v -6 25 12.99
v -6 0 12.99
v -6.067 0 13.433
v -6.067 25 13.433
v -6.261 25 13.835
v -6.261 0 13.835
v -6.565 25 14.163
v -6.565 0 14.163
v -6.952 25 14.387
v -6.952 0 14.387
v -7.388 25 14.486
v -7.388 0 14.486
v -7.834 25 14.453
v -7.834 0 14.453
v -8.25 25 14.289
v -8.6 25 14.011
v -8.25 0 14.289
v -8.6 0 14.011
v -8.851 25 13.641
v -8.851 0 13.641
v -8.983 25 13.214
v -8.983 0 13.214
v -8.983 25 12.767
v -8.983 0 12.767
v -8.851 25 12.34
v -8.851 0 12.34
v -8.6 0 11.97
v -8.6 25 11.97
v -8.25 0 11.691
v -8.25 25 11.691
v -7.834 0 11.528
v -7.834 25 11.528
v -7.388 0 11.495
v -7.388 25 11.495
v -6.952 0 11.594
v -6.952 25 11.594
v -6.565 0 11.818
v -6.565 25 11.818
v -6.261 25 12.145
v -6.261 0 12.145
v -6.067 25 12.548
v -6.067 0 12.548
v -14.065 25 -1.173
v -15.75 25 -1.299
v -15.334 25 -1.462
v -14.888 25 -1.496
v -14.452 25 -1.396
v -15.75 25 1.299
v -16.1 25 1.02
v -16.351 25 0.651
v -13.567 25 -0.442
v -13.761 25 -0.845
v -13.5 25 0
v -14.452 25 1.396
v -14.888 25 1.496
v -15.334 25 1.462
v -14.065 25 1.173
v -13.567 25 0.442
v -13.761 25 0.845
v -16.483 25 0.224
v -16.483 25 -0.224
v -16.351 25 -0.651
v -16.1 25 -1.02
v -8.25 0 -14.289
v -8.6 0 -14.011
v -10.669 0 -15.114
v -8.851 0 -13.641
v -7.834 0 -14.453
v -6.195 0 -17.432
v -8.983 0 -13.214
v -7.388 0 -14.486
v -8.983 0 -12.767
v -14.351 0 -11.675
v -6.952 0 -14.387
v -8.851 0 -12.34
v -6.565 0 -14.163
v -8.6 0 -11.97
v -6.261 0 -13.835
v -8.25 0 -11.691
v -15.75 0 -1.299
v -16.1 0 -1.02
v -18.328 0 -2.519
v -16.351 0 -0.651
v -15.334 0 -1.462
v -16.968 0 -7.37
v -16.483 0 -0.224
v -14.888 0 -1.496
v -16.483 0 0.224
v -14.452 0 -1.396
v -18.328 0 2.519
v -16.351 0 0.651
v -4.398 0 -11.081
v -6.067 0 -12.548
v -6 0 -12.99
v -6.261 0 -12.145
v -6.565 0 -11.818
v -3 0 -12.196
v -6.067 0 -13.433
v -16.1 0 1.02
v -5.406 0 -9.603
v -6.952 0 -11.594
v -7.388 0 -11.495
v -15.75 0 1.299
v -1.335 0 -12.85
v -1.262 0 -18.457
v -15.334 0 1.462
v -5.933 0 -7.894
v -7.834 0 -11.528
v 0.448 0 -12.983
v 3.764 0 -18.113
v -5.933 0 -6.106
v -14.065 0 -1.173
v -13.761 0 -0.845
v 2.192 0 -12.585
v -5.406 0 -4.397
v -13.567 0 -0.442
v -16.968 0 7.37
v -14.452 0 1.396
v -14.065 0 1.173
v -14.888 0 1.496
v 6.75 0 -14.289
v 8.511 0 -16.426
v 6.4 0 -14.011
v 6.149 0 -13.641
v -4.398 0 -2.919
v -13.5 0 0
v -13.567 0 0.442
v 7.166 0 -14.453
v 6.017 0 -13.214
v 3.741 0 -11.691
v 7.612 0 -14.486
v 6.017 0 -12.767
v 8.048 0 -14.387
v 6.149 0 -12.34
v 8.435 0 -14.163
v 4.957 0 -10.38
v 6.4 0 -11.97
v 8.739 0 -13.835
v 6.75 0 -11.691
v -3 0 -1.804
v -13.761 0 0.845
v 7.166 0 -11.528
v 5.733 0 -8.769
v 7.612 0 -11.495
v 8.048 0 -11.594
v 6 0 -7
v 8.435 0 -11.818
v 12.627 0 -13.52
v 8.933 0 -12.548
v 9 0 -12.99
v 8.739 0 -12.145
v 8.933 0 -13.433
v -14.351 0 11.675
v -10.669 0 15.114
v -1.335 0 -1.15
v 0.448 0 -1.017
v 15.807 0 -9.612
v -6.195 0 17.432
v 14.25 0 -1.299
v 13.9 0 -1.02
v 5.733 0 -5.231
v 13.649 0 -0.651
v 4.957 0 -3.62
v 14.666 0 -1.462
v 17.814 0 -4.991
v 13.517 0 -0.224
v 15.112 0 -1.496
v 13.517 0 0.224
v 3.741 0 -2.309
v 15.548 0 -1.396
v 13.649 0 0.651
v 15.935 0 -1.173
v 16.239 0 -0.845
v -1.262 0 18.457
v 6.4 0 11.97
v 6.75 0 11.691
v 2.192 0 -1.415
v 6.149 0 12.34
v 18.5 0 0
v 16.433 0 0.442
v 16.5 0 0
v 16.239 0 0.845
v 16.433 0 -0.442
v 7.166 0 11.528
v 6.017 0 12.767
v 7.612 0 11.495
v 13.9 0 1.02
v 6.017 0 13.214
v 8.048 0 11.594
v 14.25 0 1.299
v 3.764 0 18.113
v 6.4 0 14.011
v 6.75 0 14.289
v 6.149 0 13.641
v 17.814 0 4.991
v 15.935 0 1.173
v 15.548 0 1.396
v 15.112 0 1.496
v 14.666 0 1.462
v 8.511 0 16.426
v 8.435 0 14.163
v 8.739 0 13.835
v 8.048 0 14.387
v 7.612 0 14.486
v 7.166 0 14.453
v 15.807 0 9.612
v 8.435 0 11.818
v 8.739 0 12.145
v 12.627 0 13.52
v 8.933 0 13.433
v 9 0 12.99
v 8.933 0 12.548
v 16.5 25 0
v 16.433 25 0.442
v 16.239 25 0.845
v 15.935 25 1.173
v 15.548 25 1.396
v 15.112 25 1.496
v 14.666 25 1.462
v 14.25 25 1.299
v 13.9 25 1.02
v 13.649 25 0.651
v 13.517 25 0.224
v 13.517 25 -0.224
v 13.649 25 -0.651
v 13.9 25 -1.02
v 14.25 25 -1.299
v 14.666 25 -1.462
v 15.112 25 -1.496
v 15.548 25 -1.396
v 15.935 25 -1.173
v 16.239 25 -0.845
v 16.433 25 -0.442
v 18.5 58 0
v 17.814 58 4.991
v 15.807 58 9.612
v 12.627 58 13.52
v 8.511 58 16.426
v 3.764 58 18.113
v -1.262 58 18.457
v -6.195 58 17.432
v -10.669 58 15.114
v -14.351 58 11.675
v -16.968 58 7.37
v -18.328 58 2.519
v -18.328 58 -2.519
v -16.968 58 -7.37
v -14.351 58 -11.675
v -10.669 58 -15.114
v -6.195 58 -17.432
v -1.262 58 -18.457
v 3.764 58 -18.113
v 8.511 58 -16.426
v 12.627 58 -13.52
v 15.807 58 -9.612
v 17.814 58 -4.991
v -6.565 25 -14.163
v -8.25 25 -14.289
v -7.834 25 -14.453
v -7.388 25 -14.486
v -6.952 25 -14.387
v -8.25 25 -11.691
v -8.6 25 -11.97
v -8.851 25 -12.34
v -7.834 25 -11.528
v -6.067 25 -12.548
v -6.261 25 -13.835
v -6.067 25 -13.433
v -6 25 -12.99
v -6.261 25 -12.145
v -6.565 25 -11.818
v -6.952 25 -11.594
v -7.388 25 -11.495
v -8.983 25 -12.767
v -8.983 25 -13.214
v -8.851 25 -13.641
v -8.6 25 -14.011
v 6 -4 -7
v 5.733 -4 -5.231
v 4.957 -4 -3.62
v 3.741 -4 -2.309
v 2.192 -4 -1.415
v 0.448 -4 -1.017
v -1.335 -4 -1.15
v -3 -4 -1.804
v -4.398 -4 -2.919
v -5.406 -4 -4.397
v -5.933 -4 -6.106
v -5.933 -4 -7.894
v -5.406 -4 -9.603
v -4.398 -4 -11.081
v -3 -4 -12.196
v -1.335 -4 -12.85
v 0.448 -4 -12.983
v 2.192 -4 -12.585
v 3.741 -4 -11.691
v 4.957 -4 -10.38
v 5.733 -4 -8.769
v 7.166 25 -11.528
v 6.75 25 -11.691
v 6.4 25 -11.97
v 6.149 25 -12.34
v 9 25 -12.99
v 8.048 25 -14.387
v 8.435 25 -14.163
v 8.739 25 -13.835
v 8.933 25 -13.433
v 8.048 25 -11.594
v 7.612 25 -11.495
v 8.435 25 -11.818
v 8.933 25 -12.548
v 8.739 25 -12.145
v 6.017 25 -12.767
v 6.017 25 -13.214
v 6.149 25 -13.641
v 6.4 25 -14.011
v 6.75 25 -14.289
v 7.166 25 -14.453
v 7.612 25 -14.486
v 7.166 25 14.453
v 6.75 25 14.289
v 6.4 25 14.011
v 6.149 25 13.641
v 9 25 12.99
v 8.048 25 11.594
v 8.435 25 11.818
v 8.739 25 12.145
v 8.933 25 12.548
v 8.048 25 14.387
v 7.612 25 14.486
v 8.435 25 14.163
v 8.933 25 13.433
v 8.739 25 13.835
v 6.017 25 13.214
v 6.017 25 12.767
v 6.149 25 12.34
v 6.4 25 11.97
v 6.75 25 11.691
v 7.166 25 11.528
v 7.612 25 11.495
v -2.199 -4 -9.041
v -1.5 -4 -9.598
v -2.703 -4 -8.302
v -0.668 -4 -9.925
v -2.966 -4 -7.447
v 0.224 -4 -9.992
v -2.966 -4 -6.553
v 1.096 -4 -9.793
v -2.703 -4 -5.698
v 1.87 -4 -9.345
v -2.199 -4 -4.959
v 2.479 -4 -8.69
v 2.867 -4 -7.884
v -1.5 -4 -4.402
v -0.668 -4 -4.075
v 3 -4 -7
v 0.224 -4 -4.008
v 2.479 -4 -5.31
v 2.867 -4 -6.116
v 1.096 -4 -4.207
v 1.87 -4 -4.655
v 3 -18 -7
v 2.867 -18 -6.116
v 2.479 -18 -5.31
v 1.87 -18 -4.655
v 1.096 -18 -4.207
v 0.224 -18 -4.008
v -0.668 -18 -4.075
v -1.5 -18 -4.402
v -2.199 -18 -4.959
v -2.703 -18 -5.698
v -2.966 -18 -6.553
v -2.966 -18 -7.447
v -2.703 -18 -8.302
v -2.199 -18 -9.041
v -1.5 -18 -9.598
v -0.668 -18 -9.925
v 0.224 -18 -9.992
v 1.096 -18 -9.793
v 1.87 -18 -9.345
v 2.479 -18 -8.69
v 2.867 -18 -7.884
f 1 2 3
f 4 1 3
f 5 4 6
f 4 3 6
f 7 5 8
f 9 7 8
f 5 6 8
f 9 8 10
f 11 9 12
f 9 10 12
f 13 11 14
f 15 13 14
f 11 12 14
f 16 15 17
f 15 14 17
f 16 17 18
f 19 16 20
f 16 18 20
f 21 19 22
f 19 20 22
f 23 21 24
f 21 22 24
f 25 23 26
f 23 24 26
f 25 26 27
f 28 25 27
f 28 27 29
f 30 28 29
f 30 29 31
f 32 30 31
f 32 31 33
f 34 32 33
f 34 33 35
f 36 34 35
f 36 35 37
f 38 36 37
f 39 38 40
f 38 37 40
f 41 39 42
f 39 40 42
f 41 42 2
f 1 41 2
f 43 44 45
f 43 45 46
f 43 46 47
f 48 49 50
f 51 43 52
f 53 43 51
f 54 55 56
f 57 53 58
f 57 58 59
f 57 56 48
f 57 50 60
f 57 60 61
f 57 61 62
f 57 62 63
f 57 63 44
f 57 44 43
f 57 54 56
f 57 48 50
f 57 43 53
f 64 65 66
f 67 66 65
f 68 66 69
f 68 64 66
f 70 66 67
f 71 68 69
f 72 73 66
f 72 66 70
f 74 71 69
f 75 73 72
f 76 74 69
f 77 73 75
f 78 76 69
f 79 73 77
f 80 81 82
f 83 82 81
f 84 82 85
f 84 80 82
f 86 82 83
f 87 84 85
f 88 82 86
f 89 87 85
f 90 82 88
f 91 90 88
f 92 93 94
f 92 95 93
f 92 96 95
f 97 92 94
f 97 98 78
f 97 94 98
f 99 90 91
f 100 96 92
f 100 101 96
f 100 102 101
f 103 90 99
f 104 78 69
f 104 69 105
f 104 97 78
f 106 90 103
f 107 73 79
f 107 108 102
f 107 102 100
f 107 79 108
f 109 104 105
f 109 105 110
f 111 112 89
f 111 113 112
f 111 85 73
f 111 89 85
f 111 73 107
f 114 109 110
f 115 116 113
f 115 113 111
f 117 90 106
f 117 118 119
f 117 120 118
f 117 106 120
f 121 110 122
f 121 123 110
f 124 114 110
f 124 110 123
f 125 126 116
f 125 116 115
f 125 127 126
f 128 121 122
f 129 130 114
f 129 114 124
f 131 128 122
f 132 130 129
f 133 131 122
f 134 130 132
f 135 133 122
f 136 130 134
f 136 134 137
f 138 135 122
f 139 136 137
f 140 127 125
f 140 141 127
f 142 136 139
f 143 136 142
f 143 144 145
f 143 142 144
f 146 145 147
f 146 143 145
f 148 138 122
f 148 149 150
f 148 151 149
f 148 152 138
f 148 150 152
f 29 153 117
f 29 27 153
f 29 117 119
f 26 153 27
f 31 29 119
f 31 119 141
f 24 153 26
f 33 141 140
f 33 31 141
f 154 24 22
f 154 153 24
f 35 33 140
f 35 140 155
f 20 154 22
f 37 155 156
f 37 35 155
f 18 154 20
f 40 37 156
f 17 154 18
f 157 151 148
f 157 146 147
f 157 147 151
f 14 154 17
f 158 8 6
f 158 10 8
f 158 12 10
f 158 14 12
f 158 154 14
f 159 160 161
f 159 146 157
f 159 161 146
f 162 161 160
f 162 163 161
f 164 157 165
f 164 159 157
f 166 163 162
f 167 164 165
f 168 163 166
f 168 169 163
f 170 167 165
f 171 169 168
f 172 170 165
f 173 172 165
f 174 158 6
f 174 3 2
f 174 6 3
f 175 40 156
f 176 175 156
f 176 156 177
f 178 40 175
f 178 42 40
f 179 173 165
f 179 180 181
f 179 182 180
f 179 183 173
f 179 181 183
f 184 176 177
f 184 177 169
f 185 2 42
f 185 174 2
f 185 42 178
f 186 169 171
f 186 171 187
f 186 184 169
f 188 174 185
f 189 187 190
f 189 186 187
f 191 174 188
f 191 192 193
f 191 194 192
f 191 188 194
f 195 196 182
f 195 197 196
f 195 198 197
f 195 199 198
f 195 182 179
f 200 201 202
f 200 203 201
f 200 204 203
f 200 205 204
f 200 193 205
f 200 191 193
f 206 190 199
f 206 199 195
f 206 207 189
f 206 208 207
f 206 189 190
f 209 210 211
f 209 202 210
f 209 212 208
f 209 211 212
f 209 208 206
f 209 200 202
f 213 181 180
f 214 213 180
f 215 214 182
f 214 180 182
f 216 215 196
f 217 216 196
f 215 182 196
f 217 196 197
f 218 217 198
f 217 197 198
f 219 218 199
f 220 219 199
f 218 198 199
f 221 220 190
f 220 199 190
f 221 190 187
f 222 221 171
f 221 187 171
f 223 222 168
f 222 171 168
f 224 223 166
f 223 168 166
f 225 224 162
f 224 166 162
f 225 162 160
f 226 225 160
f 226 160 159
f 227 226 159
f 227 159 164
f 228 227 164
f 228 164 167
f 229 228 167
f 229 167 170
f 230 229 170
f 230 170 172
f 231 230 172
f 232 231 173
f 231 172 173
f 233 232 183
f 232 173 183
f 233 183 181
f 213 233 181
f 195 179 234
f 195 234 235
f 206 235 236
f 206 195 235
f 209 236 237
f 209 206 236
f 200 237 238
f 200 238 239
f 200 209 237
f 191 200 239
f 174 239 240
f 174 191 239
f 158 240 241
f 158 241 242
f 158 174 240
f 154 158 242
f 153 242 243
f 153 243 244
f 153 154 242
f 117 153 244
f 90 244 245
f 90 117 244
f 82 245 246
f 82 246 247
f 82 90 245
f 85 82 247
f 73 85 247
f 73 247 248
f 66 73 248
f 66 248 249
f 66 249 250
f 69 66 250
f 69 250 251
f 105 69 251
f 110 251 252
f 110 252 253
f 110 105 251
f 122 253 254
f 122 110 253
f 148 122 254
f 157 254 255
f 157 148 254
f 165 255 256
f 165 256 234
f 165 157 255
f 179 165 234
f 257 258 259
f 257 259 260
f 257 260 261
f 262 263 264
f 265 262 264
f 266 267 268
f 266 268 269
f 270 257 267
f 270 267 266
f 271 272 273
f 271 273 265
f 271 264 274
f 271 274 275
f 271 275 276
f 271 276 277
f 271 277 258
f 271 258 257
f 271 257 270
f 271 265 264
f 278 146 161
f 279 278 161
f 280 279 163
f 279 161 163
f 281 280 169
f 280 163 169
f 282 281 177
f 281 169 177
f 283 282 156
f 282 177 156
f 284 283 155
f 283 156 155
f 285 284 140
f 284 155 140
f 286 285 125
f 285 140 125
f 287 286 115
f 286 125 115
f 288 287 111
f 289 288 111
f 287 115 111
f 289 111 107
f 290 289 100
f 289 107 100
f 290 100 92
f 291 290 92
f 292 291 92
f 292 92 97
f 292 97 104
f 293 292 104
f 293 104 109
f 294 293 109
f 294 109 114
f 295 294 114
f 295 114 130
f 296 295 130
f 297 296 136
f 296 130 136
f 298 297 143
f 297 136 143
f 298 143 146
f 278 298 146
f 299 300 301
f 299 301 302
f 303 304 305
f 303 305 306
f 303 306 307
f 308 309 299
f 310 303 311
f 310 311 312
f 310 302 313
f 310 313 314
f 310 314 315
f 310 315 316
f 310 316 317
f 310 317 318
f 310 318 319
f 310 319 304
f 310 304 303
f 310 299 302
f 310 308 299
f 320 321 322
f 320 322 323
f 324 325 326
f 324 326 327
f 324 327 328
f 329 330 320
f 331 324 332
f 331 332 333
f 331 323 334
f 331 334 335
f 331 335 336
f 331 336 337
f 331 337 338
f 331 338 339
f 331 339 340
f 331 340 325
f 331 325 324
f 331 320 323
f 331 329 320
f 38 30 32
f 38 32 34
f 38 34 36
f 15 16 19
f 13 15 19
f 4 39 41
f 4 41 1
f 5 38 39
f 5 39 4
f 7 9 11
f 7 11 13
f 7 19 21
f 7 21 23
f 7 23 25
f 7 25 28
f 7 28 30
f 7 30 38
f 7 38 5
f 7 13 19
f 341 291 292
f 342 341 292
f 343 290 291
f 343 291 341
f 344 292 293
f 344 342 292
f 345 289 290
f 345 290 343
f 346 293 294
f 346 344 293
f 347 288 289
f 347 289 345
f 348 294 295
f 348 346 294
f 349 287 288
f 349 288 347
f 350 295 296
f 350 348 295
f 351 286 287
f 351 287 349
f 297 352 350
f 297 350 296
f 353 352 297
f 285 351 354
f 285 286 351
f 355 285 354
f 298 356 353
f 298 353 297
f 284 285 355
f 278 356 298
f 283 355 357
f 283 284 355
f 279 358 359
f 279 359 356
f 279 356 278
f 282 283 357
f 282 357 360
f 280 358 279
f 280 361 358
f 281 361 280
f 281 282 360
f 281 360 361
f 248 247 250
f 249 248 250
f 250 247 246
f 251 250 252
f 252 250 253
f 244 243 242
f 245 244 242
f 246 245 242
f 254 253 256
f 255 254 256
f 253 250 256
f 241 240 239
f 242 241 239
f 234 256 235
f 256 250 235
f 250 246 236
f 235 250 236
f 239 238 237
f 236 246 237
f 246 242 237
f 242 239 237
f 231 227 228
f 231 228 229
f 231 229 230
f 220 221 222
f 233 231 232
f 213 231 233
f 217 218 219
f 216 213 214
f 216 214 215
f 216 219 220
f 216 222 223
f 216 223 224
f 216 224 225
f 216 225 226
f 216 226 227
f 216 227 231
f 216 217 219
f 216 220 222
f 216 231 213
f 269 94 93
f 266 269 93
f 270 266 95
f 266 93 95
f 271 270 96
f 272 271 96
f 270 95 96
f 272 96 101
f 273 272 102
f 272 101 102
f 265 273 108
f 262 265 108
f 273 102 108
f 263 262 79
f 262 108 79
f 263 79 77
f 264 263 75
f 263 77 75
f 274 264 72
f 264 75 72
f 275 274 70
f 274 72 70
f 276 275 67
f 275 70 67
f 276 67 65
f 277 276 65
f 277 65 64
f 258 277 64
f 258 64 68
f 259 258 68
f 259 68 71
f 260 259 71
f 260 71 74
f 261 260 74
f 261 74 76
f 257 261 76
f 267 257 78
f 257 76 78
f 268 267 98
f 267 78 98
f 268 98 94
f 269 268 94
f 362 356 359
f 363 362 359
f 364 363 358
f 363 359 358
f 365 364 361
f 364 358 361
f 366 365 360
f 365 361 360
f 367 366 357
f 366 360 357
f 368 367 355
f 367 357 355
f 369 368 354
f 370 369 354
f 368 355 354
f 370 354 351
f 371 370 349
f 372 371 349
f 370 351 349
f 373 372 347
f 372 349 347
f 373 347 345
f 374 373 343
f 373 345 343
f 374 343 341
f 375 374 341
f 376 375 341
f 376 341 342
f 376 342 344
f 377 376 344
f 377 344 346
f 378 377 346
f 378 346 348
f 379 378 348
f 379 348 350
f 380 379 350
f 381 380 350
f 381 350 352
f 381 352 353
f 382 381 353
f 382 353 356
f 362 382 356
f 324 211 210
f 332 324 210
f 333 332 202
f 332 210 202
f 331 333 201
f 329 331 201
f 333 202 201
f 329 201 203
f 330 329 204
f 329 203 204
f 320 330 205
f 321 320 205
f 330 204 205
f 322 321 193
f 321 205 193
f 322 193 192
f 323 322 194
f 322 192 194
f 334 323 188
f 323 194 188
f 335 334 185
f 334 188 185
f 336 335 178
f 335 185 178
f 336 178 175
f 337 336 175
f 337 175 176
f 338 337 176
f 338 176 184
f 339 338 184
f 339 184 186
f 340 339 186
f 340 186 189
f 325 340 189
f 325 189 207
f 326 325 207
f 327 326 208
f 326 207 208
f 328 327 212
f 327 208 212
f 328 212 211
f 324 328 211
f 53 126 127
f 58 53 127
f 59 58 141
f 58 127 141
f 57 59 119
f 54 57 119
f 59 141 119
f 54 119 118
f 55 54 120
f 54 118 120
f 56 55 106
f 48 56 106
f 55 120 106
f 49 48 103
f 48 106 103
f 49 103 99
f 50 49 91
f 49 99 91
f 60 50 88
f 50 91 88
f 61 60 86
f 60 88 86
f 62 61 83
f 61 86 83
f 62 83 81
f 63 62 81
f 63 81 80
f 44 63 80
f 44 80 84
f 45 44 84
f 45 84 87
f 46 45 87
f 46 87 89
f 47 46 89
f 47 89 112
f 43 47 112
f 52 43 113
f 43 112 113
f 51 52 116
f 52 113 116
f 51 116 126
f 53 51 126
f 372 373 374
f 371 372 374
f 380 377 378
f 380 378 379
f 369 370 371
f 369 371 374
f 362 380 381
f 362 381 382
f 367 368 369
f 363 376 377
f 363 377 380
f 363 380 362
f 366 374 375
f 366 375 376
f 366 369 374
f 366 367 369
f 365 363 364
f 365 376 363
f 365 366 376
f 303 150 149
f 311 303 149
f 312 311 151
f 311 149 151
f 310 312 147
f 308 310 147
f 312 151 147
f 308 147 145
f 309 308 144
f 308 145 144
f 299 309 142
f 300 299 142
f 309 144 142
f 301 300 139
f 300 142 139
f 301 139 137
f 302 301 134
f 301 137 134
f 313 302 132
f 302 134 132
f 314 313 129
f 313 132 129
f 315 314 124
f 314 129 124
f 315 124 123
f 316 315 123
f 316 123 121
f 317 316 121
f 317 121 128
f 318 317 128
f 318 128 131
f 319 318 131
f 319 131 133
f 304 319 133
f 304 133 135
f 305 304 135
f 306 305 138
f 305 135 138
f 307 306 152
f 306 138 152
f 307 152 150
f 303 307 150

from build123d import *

# Parameters (mm, degrees)
F0_R     = 18.5
F0_R_2   = 1.5
F0_R_3   = 6
F0_R_4   = 3
F1_DEPTH = 58
F2_DEPTH = 4
F3_DEPTH = 18
F4_DEPTH = 25


with BuildPart() as f1:
    # F0 (on Front) → F1 (new body)
    with BuildSketch(Plane.XZ):
        Circle(F0_R)
        with Locations((-7.5, -12.990381)):
            Circle(F0_R_2, mode=Mode.SUBTRACT)
        with Locations((7.5, -12.990381)):
            Circle(F0_R_2, mode=Mode.SUBTRACT)
        with Locations((0, -7)):
            Circle(F0_R_3, mode=Mode.SUBTRACT)
        with Locations((-15, 0)):
            Circle(F0_R_2, mode=Mode.SUBTRACT)
        with Locations((-7.5, 12.990381)):
            Circle(F0_R_2, mode=Mode.SUBTRACT)
        with Locations((15, 0)):
            Circle(F0_R_2, mode=Mode.SUBTRACT)
        with Locations((7.5, 12.990381)):
            Circle(F0_R_2, mode=Mode.SUBTRACT)
        with Locations((0, -7)):
            Circle(F0_R_3)
        with Locations((0, -7)):
            Circle(F0_R_4, mode=Mode.SUBTRACT)
        with Locations((0, -7)):
            Circle(F0_R_4)
        with Locations((-7.5, 12.990381)):
            Circle(F0_R_2)
        with Locations((7.5, 12.990381)):
            Circle(F0_R_2)
        with Locations((15, 0)):
            Circle(F0_R_2)
        with Locations((7.5, -12.990381)):
            Circle(F0_R_2)
        with Locations((-7.5, -12.990381)):
            Circle(F0_R_2)
        with Locations((-15, 0)):
            Circle(F0_R_2)
    extrude(amount=-F1_DEPTH)

    # F0 (on Front) → F2 (join)
    with BuildSketch(Plane.XZ):
        with Locations((0, -7)):
            Circle(F0_R_3)
        with Locations((0, -7)):
            Circle(F0_R_4, mode=Mode.SUBTRACT)
        with Locations((0, -7)):
            Circle(F0_R_4)
    extrude(amount=F2_DEPTH)

    # F0 (on Front) → F3 (join)
    with BuildSketch(Plane.XZ):
        with Locations((0, -7)):
            Circle(F0_R_4)
    extrude(amount=F3_DEPTH)

    # F0 (on Front) → F4 (cut)
    with BuildSketch(Plane.XZ):
        with Locations((7.5, 12.990381)):
            Circle(F0_R_2)
        with Locations((-7.5, 12.990381)):
            Circle(F0_R_2)
        with Locations((-15, 0)):
            Circle(F0_R_2)
        with Locations((7.5, -12.990381)):
            Circle(F0_R_2)
        with Locations((15, 0)):
            Circle(F0_R_2)
        with Locations((-7.5, -12.990381)):
            Circle(F0_R_2)
    extrude(amount=-F4_DEPTH, mode=Mode.SUBTRACT)


solid = f1.part
